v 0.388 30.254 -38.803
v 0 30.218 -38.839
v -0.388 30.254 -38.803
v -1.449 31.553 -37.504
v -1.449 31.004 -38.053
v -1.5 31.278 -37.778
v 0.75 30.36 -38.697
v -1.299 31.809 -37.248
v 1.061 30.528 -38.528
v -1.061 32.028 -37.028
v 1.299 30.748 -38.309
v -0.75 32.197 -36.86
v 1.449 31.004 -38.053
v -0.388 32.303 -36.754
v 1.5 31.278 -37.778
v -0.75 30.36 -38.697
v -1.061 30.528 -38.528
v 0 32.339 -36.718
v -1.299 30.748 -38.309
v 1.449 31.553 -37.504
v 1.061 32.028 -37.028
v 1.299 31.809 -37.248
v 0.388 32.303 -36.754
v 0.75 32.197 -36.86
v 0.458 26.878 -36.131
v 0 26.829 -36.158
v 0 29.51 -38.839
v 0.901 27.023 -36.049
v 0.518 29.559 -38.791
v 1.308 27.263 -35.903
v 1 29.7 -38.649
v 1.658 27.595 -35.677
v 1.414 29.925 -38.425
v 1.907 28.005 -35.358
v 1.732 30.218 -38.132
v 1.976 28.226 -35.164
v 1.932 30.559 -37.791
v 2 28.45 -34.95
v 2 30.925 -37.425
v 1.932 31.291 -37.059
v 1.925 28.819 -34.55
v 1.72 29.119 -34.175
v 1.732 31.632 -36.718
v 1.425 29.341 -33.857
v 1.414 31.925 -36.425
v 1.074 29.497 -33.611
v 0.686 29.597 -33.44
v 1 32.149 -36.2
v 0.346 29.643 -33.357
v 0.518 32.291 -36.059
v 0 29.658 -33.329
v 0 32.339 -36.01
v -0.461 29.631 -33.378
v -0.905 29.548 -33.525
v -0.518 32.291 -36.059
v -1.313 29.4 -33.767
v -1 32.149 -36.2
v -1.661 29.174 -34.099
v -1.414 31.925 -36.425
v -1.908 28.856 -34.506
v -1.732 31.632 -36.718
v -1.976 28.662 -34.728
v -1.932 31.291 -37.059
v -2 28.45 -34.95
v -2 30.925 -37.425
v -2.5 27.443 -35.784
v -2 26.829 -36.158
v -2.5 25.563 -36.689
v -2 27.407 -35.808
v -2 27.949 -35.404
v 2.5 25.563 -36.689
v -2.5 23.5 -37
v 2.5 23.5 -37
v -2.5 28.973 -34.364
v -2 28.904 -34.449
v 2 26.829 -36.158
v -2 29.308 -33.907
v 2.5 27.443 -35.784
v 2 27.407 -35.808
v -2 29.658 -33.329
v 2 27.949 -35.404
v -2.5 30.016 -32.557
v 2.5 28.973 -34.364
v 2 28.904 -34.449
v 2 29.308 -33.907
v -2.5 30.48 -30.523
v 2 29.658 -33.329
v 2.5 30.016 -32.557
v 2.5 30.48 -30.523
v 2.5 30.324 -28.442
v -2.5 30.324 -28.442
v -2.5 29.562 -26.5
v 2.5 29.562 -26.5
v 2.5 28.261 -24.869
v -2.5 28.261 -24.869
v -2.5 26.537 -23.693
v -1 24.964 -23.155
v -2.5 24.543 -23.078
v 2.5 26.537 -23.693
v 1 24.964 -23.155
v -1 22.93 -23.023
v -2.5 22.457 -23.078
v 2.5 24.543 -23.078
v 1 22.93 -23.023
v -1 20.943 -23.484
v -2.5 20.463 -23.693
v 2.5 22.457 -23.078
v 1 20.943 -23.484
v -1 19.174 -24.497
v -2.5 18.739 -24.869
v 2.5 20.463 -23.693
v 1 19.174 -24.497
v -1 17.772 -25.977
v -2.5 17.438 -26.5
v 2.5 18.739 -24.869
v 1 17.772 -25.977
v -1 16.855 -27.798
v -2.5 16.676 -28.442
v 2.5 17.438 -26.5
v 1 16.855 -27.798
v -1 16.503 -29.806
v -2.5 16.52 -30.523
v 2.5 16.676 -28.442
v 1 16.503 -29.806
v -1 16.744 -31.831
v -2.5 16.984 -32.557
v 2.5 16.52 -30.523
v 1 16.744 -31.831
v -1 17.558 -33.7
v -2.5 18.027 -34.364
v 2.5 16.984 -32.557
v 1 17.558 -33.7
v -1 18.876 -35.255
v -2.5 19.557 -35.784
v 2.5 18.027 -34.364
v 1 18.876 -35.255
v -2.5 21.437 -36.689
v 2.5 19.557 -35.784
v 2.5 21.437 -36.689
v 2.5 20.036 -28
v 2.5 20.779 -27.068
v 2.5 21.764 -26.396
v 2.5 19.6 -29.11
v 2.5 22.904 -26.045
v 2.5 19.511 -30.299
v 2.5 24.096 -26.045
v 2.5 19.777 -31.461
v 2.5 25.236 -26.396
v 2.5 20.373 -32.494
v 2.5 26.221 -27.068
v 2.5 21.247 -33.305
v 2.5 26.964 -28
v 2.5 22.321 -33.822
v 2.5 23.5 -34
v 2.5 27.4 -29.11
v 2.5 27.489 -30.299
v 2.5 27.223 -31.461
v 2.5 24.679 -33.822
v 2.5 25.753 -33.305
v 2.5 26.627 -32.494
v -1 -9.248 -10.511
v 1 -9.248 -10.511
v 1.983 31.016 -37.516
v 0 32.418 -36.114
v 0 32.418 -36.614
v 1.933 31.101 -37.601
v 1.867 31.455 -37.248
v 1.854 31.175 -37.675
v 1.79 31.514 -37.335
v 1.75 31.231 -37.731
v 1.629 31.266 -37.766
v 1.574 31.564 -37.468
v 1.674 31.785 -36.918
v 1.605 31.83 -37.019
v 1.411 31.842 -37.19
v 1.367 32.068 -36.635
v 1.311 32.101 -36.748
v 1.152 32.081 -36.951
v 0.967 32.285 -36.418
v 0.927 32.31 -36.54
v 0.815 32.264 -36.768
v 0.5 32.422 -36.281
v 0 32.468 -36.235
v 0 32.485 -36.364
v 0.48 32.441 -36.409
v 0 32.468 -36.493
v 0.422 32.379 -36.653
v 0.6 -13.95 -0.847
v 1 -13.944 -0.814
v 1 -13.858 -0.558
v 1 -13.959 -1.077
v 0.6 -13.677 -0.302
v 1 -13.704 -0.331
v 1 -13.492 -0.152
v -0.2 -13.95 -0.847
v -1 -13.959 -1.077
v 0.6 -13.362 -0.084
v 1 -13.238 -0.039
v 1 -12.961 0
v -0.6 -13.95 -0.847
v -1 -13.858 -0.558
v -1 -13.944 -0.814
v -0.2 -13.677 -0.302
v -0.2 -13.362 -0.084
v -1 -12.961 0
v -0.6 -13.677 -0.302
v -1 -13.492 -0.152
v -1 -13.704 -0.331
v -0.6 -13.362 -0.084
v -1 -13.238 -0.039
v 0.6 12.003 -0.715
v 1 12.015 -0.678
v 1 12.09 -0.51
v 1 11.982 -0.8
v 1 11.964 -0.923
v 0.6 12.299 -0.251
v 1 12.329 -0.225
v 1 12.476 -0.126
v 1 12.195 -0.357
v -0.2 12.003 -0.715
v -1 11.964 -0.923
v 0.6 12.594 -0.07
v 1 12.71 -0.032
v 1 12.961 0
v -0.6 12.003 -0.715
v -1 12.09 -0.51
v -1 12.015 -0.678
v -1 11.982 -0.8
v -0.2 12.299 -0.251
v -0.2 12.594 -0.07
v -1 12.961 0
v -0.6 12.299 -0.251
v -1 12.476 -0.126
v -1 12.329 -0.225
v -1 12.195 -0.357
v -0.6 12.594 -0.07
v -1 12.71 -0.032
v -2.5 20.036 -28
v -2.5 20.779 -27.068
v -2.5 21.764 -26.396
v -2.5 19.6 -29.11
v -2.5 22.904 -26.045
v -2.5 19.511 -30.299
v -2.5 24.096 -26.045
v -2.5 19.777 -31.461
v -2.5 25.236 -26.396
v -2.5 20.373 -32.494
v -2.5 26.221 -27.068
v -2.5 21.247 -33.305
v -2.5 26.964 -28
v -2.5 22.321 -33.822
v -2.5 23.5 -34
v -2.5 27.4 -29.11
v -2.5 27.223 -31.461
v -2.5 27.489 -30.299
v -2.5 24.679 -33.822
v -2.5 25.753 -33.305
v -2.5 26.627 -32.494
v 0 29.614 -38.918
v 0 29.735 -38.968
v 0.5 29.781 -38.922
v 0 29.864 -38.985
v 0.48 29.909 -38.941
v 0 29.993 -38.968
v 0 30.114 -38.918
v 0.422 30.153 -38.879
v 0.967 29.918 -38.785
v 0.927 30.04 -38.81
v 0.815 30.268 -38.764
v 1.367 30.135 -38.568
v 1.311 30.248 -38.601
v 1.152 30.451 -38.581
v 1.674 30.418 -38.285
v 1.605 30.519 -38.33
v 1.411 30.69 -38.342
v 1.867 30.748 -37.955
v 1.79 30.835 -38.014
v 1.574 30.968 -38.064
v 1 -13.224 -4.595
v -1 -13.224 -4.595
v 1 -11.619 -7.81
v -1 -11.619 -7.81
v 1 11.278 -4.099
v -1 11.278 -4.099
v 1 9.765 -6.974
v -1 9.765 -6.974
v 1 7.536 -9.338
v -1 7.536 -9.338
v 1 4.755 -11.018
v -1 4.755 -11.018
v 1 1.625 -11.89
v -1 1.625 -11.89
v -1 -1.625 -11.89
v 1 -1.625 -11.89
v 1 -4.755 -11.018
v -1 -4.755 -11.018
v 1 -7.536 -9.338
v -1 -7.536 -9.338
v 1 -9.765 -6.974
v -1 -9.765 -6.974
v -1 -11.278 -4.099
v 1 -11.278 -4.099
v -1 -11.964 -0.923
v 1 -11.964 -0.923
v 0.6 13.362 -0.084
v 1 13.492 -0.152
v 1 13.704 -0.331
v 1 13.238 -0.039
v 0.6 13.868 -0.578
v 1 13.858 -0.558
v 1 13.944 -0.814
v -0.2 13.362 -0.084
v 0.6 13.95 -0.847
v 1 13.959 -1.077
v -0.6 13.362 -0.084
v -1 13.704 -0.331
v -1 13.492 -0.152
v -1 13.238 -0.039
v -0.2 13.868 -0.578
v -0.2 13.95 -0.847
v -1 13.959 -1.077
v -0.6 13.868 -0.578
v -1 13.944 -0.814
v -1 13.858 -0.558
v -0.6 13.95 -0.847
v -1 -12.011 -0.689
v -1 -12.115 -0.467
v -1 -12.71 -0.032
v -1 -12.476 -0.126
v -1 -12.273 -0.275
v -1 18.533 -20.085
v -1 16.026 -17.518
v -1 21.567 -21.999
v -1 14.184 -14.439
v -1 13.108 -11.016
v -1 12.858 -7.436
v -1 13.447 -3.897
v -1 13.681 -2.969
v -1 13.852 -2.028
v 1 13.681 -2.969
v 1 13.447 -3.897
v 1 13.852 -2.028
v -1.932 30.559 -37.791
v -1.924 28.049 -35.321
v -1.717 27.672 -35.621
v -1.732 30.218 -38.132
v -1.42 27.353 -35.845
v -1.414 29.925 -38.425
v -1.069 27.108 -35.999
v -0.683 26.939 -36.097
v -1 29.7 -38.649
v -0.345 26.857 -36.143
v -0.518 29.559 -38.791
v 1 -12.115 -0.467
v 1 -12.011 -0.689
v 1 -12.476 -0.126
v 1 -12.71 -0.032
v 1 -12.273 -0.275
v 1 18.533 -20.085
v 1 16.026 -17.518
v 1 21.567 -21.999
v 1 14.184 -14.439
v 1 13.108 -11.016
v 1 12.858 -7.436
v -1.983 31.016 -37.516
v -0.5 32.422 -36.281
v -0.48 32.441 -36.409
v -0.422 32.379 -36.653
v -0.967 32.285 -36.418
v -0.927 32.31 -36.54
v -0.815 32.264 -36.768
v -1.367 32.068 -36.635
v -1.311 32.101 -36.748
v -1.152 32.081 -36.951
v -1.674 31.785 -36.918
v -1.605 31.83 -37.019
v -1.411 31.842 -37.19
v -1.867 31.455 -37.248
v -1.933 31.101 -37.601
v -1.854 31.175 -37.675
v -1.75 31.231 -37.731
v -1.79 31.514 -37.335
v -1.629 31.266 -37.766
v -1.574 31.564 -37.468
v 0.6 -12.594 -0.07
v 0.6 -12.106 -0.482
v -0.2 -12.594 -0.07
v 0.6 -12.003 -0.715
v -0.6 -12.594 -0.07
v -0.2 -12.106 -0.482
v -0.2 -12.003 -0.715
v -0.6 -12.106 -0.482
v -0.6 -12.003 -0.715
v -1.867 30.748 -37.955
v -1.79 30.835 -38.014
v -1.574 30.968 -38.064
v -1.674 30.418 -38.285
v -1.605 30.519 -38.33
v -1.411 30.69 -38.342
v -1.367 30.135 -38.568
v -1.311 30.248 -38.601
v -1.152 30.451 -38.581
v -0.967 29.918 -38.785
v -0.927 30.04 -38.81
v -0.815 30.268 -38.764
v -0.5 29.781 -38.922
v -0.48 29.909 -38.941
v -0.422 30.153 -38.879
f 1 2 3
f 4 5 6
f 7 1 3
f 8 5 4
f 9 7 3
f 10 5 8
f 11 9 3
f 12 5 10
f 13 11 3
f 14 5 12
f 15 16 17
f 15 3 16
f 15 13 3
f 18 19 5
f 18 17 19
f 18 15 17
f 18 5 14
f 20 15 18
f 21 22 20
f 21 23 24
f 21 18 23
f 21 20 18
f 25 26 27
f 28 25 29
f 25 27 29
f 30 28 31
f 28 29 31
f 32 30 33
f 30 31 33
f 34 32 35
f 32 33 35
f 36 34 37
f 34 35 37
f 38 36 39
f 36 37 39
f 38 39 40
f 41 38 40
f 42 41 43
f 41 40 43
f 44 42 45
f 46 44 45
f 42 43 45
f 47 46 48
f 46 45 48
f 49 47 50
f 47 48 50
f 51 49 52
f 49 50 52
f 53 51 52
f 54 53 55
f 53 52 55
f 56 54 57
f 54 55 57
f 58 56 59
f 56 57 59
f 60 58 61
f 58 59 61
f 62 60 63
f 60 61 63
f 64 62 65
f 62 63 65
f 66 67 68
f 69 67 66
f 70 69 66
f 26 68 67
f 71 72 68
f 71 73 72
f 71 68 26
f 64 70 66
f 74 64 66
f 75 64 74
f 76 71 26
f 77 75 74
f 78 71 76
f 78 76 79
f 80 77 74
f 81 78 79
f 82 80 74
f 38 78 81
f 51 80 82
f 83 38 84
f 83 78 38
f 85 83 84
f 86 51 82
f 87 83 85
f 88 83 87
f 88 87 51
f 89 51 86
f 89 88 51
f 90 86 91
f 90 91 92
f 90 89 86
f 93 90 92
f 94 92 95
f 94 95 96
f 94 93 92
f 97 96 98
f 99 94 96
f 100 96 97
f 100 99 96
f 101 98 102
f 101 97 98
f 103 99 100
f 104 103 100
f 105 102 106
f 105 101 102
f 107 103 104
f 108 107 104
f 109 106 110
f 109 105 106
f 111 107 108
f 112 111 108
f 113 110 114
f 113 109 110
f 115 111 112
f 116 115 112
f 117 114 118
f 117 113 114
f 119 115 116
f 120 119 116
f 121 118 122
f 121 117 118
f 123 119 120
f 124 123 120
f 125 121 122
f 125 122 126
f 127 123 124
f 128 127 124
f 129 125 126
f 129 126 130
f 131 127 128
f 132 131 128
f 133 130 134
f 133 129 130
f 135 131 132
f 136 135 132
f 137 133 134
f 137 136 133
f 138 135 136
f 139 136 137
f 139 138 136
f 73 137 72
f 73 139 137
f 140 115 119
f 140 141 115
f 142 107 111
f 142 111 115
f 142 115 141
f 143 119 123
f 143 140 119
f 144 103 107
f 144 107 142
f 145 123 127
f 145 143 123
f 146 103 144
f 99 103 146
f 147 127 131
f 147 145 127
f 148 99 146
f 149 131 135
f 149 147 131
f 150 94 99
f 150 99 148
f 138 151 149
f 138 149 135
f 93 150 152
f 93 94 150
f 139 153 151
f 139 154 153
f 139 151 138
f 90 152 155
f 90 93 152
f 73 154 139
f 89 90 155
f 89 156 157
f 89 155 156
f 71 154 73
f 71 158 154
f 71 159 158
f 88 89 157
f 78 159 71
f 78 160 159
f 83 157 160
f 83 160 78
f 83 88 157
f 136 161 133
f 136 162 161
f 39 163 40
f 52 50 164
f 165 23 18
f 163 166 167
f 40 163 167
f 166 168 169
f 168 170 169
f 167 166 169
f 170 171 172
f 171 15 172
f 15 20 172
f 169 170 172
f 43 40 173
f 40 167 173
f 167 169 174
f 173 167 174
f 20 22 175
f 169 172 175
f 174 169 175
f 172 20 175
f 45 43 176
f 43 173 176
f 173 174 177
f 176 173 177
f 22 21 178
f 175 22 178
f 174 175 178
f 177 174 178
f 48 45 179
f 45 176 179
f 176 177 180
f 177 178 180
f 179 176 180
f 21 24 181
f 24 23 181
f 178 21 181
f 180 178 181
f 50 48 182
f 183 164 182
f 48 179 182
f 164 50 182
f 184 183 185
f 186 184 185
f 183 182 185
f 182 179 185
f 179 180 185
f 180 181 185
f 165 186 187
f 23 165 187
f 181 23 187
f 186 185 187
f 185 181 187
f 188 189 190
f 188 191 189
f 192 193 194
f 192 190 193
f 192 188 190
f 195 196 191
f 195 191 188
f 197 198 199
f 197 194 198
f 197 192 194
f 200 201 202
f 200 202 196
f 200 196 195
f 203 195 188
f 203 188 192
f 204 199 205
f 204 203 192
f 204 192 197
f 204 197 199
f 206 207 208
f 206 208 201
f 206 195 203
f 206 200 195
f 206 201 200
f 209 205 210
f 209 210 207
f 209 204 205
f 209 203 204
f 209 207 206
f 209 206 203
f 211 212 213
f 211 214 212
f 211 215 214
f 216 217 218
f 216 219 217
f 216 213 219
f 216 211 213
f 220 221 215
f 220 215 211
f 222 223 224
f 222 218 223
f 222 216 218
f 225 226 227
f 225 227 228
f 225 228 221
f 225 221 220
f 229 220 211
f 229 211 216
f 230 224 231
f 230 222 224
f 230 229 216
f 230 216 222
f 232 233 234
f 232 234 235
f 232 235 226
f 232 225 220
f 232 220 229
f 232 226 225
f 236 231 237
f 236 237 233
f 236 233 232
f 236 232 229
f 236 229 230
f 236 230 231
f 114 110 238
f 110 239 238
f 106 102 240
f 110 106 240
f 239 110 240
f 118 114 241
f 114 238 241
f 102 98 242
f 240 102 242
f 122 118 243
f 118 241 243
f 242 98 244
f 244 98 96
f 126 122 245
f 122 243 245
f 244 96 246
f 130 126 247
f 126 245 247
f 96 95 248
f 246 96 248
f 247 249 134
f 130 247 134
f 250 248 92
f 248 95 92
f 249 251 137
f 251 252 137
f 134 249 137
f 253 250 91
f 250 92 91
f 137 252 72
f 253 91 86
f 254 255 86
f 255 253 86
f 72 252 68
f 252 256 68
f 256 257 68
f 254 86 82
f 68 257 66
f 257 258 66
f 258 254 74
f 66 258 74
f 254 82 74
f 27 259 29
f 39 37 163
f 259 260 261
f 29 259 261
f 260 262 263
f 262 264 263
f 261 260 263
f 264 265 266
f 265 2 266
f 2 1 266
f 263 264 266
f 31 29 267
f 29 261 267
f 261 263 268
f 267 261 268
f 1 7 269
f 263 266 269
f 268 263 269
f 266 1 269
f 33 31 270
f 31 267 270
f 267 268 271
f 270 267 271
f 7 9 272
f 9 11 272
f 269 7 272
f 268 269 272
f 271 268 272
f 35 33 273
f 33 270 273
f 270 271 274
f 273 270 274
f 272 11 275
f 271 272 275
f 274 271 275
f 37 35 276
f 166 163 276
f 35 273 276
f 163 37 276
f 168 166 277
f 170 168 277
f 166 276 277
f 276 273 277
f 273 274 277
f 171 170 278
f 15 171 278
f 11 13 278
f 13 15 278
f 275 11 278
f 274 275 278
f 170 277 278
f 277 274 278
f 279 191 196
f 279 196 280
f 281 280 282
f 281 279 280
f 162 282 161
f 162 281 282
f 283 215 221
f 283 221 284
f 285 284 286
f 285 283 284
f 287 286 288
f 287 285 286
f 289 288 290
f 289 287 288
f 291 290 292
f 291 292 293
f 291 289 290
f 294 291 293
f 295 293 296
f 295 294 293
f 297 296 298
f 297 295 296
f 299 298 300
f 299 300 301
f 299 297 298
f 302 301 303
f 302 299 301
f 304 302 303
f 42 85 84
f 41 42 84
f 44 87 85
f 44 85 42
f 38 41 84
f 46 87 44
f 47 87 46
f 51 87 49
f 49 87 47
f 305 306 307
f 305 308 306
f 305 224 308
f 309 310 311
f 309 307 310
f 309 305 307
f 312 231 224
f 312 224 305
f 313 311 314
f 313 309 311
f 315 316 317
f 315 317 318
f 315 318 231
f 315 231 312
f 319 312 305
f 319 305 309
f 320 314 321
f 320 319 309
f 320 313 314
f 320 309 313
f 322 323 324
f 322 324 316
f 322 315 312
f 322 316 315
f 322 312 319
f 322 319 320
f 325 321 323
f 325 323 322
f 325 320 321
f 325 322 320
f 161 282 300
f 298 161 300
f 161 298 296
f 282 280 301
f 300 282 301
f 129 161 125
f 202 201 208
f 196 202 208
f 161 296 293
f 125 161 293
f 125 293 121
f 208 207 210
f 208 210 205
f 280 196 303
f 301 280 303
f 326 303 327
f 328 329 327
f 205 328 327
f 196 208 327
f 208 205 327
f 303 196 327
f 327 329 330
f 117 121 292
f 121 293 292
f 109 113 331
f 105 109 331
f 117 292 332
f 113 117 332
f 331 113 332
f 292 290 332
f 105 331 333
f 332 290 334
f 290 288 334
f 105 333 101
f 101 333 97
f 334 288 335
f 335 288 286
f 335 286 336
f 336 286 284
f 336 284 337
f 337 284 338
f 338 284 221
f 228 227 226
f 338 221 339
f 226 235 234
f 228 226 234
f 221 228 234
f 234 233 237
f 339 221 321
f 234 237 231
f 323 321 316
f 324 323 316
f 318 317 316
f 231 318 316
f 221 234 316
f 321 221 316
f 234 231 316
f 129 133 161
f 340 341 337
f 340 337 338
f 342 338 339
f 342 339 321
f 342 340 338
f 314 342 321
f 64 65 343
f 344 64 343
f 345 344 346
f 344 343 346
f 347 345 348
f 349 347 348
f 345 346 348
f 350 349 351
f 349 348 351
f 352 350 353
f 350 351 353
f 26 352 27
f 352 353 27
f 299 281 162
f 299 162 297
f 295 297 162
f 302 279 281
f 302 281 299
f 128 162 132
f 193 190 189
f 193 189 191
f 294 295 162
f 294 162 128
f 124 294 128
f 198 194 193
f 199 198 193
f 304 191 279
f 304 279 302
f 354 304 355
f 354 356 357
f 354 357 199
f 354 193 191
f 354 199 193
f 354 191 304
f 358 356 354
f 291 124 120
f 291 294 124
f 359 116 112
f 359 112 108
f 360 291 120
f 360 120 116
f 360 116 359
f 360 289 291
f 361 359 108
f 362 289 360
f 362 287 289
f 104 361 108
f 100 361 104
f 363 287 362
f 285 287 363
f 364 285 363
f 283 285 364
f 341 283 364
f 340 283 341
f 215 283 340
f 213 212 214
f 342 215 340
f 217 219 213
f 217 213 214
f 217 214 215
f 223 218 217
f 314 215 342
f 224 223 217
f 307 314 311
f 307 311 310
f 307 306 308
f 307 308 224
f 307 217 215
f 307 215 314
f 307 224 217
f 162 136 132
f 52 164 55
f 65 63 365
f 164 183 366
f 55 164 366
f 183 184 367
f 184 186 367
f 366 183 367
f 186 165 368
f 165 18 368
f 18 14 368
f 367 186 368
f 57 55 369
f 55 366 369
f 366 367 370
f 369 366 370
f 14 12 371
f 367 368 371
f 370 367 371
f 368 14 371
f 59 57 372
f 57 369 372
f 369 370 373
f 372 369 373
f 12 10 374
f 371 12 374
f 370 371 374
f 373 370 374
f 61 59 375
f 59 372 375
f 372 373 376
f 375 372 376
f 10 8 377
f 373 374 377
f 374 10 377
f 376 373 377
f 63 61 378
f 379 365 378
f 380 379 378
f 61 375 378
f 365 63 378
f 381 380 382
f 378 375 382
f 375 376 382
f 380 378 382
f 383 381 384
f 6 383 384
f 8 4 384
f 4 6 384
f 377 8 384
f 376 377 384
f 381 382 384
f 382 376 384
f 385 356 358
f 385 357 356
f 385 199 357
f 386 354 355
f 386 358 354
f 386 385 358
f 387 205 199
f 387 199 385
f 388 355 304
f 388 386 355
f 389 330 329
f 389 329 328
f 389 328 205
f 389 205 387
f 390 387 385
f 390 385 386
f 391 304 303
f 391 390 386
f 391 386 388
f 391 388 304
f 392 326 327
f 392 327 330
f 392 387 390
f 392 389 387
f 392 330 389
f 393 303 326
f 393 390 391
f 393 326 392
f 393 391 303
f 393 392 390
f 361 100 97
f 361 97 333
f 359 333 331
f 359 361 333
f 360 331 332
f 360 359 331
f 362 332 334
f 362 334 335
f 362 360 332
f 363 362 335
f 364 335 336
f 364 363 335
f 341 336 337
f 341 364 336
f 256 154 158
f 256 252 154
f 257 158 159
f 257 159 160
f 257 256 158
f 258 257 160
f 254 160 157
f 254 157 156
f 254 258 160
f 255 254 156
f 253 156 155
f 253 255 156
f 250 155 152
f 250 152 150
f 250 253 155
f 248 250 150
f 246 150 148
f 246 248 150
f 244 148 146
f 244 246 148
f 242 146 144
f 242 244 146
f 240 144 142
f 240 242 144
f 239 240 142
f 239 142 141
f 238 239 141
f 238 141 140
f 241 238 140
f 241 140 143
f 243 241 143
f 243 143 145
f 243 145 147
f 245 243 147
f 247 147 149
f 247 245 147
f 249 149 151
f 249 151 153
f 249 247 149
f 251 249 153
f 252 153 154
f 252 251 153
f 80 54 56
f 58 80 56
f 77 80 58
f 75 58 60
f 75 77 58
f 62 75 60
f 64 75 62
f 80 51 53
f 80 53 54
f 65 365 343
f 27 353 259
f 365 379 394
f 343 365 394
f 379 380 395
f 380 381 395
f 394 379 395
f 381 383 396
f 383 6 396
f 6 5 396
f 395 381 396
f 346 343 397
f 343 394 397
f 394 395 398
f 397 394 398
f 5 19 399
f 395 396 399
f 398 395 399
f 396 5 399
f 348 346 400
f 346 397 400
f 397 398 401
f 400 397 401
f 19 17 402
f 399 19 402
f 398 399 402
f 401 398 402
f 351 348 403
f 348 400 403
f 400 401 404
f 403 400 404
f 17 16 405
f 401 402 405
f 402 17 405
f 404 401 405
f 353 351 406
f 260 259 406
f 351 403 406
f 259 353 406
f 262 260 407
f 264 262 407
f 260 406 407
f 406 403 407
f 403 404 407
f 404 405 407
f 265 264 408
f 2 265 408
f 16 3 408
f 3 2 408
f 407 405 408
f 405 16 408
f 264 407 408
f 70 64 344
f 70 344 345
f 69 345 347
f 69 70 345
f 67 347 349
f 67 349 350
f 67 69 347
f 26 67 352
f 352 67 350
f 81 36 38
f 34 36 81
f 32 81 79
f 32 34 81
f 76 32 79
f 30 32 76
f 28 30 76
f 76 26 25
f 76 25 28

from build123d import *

# Parameters (mm, degrees)
BOSS_EXTRUDE1_DEPTH     = 1
SKETCH1_3_R             = 7
SKETCH1_3_R_2           = 4
BOSS_EXTRUDE2_DEPTH     = 2.5
BOSS_EXTRUDE3_DEPTH     = 2
CUT_EXTRUDE1_REACH      = 61.611
CUT_EXTRUDE1_END_RADIUS = 7
FILLET1_R               = 0.5
FILLET2_START           = -2
FILLET2_DEPTH           = 4
FILLET3_START           = -2
FILLET3_DEPTH           = 4


with BuildPart() as part:
    # Sketch1 → Boss-Extrude1 (new, symmetric)
    with BuildSketch(Plane.YZ):
        with BuildLine():
            Line((-9.247850598, -10.510816301), (18.876074701, -35.255408151))
            ThreePointArc((18.876074701, -35.255408151), (17.246857686, -26.853857727), (24.964224943, -23.154852426))
            ThreePointArc((24.964224943, -23.154852426), (15.014290028, -16.032467293), (13.446719603, -3.896887464))
            ThreePointArc((13.446719603, -3.896887464), (13.860989763, -1.967984445), (14, 0))
            Line((14, 0), (12, 0))
            ThreePointArc((12, 0), (0, -12), (-12, 0))
            Line((-12, 0), (-14, 0))
            ThreePointArc((-14, 0), (-12.756761117, -5.767585788), (-9.247850598, -10.510816301))
        make_face()
    extrude(amount=BOSS_EXTRUDE1_DEPTH, both=True)

    # Sketch1<3> → Boss-Extrude2 (add, symmetric)
    with BuildSketch(Plane.YZ):
        with Locations(Location((23.5, -30, 0), (0, 0, 270))):
            Circle(SKETCH1_3_R)
        with Locations(Location((23.5, -30, 0), (0, 0, 270))):
            Circle(SKETCH1_3_R_2, mode=Mode.SUBTRACT)
    extrude(amount=BOSS_EXTRUDE2_DEPTH, both=True)

    # Sketch1<4> → Boss-Extrude3 (add, symmetric)
    with BuildSketch(Plane.YZ):
        with BuildLine():
            ThreePointArc((29.657630053, -33.329202928), (29.11248608, -34.183300133), (28.449747468, -34.949747468))
            Line((28.449747468, -34.949747468), (31.278174593, -37.778174593))
            Line((31.278174593, -37.778174593), (32.692388155, -36.363961031))
            Line((32.692388155, -36.363961031), (29.657630053, -33.329202928))
        make_face()
        with BuildLine():
            ThreePointArc((28.449747468, -34.949747468), (27.683300133, -35.61248608), (26.829202928, -36.157630053))
            Line((26.829202928, -36.157630053), (29.863961031, -39.192388155))
            Line((29.863961031, -39.192388155), (31.278174593, -37.778174593))
            Line((31.278174593, -37.778174593), (28.449747468, -34.949747468))
        make_face()
    extrude(amount=BOSS_EXTRUDE3_DEPTH, both=True)

    # Cut-Extrude1: up to this cylinder (the profile starts outside it)
    cut_extrude1_end = Plane(origin=(0, 23.5, -30), z_dir=(-1, 0, 0)) * Cylinder(CUT_EXTRUDE1_END_RADIUS, 141.328528, mode=Mode.PRIVATE)
    # Sketch2 → Cut-Extrude1 (cut, up to the surface)
    with BuildSketch(Plane(origin=(0, 34.528174593, -34.528174593), x_dir=(-1, 0, 0), z_dir=(0, 0.707106781186549, -0.7071067811865461)), mode=Mode.PRIVATE) as cut_extrude1_sk1:
        with BuildLine():
            ThreePointArc((-2, -4.596194078), (-1.414213562, -3.181980515), (0, -2.596194078))
            Line((0, -2.596194078), (-2, -2.596194078))
            Line((-2, -2.596194078), (-2, -4.596194078))
        make_face()
    cut_extrude1_tool1 = extrude(cut_extrude1_sk1.sketch, amount=-CUT_EXTRUDE1_REACH, mode=Mode.PRIVATE) - cut_extrude1_end
    add(cut_extrude1_tool1.solids().sort_by_distance((1.553264, 32.376498, -36.679851))[0], mode=Mode.SUBTRACT)
    # Sketch2 → Cut-Extrude1 (cut, up to the surface)
    with BuildSketch(Plane(origin=(0, 34.528174593, -34.528174593), x_dir=(-1, 0, 0), z_dir=(0, 0.707106781186549, -0.7071067811865461)), mode=Mode.PRIVATE) as cut_extrude1_sk2:
        with BuildLine():
            ThreePointArc((0, -2.596194078), (1.414213562, -3.181980515), (2, -4.596194078))
            Line((2, -4.596194078), (2, -2.596194078))
            Line((2, -2.596194078), (0, -2.596194078))
        make_face()
    cut_extrude1_tool2 = extrude(cut_extrude1_sk2.sketch, amount=-CUT_EXTRUDE1_REACH, mode=Mode.PRIVATE) - cut_extrude1_end
    add(cut_extrude1_tool2.solids().sort_by_distance((-1.553264, 32.376498, -36.679851))[0], mode=Mode.SUBTRACT)
    # Sketch2 → Cut-Extrude1 (cut, up to the surface)
    with BuildSketch(Plane(origin=(0, 34.528174593, -34.528174593), x_dir=(-1, 0, 0), z_dir=(0, 0.707106781186549, -0.7071067811865461)), mode=Mode.PRIVATE) as cut_extrude1_sk3:
        with BuildLine():
            Line((1.9e-08, -6.596194078), (2, -6.596194078))
            Line((2, -6.596194078), (2, -4.596194078))
            ThreePointArc((2, -4.596194078), (1.414213569, -6.010407633), (1.9e-08, -6.596194078))
        make_face()
    cut_extrude1_tool3 = extrude(cut_extrude1_sk3.sketch, amount=-CUT_EXTRUDE1_REACH, mode=Mode.PRIVATE) - cut_extrude1_end
    add(cut_extrude1_tool3.solids().sort_by_distance((-1.553264, 30.179851, -38.876498))[0], mode=Mode.SUBTRACT)
    # Sketch2 → Cut-Extrude1 (cut, up to the surface)
    with BuildSketch(Plane(origin=(0, 34.528174593, -34.528174593), x_dir=(-1, 0, 0), z_dir=(0, 0.707106781186549, -0.7071067811865461)), mode=Mode.PRIVATE) as cut_extrude1_sk4:
        with BuildLine():
            Line((-2, -6.596194078), (1.9e-08, -6.596194078))
            ThreePointArc((1.9e-08, -6.596194078), (-1.414213556, -6.010407647), (-2, -4.596194078))
            Line((-2, -4.596194078), (-2, -6.596194078))
        make_face()
    cut_extrude1_tool4 = extrude(cut_extrude1_sk4.sketch, amount=-CUT_EXTRUDE1_REACH, mode=Mode.PRIVATE) - cut_extrude1_end
    add(cut_extrude1_tool4.solids().sort_by_distance((1.553264, 30.179851, -38.876498))[0], mode=Mode.SUBTRACT)

    # Fillet1
    fillet1_edges = [part.edges().sort_by_distance(p)[0] for p in [
        (0, 29.863961031, -39.192388155),
    ]]
    fillet(fillet1_edges, radius=FILLET1_R)

    # Fillet2: read off the stored shape, not the designer's step
    # Fillet2 outline → Fillet2 (cut)
    with BuildSketch(Plane.YZ.offset(FILLET2_START)):
        with BuildLine():
            ThreePointArc((-14, 0), (-13.989625763, -0.538860843), (-13.958518428, -1.076923077))
            add(Edge.make_bspline(
                [(-13.958518428, -1.076923077), (-13.978684128, -0.815545726), (-13.917861816, -0.505978869), (-13.724957355, -0.19992372), (-13.383008233, 5e-09), (-12.961481386, 0)],
                knots=[0, 0, 0, 0, 0, 0, 0.519259304, 0.519259304, 0.519259304, 0.519259304, 0.519259304, 0.519259304], degree=5, weights=[1, 0.792296278, 0.638518602, 0.53866697, 0.492741383, 0.500741842]))
            Line((-12.961481386, 0), (-14, 0))
        make_face()
        with BuildLine():
            Line((-12, 0), (-12.961481386, 0))
            add(Edge.make_bspline(
                [(-12.961481386, 0), (-12.583056271, -4e-09), (-12.270553606, -0.164313436), (-12.073438627, -0.418546888), (-11.982758039, -0.685704598), (-11.964444366, -0.923076923)],
                knots=[0.519259304, 0.519259304, 0.519259304, 0.519259304, 0.519259304, 0.519259304, 1, 1, 1, 1, 1, 1], degree=5, weights=[0.500741842, 0.508148827, 0.561778135, 0.661629767, 0.807703722, 1]))
            ThreePointArc((-11.964444366, -0.923076923), (-11.991107797, -0.461880723), (-12, 0))
        make_face()
    extrude(amount=FILLET2_DEPTH, mode=Mode.SUBTRACT)

    # Fillet3: read off the stored shape, not the designer's step
    # Fillet3 outline → Fillet3 (cut)
    with BuildSketch(Plane.YZ.offset(FILLET3_START)):
        with BuildLine():
            ThreePointArc((12, 0), (11.991107797, -0.461880723), (11.964444366, -0.923076923))
            add(Edge.make_bspline(
                [(11.964444366, -0.923076923), (11.982758039, -0.685704597), (12.073438628, -0.418546886), (12.270553609, -0.164313433), (12.583056275, -2e-09), (12.961481392, 0)],
                knots=[0, 0, 0, 0, 0, 0, 0.480740697, 0.480740697, 0.480740697, 0.480740697, 0.480740697, 0.480740697], degree=5, weights=[1, 0.807703721, 0.661629766, 0.561778134, 0.508148826, 0.500741841]))
            Line((12.961481392, 0), (12, 0))
        make_face()
        with BuildLine():
            Line((14, 0), (12.961481392, 0))
            add(Edge.make_bspline(
                [(12.961481392, 0), (13.383008238, 2e-09), (13.724957357, -0.199923723), (13.917861817, -0.505978871), (13.978684128, -0.815545728), (13.958518427, -1.076923077)],
                knots=[0.480740697, 0.480740697, 0.480740697, 0.480740697, 0.480740697, 0.480740697, 1, 1, 1, 1, 1, 1], degree=5, weights=[0.500741841, 0.492741384, 0.538666971, 0.638518602, 0.792296279, 1]))
            ThreePointArc((13.958518427, -1.076923077), (13.989625763, -0.538860843), (14, 0))
        make_face()
    extrude(amount=FILLET3_DEPTH, mode=Mode.SUBTRACT)


solid = part.part
